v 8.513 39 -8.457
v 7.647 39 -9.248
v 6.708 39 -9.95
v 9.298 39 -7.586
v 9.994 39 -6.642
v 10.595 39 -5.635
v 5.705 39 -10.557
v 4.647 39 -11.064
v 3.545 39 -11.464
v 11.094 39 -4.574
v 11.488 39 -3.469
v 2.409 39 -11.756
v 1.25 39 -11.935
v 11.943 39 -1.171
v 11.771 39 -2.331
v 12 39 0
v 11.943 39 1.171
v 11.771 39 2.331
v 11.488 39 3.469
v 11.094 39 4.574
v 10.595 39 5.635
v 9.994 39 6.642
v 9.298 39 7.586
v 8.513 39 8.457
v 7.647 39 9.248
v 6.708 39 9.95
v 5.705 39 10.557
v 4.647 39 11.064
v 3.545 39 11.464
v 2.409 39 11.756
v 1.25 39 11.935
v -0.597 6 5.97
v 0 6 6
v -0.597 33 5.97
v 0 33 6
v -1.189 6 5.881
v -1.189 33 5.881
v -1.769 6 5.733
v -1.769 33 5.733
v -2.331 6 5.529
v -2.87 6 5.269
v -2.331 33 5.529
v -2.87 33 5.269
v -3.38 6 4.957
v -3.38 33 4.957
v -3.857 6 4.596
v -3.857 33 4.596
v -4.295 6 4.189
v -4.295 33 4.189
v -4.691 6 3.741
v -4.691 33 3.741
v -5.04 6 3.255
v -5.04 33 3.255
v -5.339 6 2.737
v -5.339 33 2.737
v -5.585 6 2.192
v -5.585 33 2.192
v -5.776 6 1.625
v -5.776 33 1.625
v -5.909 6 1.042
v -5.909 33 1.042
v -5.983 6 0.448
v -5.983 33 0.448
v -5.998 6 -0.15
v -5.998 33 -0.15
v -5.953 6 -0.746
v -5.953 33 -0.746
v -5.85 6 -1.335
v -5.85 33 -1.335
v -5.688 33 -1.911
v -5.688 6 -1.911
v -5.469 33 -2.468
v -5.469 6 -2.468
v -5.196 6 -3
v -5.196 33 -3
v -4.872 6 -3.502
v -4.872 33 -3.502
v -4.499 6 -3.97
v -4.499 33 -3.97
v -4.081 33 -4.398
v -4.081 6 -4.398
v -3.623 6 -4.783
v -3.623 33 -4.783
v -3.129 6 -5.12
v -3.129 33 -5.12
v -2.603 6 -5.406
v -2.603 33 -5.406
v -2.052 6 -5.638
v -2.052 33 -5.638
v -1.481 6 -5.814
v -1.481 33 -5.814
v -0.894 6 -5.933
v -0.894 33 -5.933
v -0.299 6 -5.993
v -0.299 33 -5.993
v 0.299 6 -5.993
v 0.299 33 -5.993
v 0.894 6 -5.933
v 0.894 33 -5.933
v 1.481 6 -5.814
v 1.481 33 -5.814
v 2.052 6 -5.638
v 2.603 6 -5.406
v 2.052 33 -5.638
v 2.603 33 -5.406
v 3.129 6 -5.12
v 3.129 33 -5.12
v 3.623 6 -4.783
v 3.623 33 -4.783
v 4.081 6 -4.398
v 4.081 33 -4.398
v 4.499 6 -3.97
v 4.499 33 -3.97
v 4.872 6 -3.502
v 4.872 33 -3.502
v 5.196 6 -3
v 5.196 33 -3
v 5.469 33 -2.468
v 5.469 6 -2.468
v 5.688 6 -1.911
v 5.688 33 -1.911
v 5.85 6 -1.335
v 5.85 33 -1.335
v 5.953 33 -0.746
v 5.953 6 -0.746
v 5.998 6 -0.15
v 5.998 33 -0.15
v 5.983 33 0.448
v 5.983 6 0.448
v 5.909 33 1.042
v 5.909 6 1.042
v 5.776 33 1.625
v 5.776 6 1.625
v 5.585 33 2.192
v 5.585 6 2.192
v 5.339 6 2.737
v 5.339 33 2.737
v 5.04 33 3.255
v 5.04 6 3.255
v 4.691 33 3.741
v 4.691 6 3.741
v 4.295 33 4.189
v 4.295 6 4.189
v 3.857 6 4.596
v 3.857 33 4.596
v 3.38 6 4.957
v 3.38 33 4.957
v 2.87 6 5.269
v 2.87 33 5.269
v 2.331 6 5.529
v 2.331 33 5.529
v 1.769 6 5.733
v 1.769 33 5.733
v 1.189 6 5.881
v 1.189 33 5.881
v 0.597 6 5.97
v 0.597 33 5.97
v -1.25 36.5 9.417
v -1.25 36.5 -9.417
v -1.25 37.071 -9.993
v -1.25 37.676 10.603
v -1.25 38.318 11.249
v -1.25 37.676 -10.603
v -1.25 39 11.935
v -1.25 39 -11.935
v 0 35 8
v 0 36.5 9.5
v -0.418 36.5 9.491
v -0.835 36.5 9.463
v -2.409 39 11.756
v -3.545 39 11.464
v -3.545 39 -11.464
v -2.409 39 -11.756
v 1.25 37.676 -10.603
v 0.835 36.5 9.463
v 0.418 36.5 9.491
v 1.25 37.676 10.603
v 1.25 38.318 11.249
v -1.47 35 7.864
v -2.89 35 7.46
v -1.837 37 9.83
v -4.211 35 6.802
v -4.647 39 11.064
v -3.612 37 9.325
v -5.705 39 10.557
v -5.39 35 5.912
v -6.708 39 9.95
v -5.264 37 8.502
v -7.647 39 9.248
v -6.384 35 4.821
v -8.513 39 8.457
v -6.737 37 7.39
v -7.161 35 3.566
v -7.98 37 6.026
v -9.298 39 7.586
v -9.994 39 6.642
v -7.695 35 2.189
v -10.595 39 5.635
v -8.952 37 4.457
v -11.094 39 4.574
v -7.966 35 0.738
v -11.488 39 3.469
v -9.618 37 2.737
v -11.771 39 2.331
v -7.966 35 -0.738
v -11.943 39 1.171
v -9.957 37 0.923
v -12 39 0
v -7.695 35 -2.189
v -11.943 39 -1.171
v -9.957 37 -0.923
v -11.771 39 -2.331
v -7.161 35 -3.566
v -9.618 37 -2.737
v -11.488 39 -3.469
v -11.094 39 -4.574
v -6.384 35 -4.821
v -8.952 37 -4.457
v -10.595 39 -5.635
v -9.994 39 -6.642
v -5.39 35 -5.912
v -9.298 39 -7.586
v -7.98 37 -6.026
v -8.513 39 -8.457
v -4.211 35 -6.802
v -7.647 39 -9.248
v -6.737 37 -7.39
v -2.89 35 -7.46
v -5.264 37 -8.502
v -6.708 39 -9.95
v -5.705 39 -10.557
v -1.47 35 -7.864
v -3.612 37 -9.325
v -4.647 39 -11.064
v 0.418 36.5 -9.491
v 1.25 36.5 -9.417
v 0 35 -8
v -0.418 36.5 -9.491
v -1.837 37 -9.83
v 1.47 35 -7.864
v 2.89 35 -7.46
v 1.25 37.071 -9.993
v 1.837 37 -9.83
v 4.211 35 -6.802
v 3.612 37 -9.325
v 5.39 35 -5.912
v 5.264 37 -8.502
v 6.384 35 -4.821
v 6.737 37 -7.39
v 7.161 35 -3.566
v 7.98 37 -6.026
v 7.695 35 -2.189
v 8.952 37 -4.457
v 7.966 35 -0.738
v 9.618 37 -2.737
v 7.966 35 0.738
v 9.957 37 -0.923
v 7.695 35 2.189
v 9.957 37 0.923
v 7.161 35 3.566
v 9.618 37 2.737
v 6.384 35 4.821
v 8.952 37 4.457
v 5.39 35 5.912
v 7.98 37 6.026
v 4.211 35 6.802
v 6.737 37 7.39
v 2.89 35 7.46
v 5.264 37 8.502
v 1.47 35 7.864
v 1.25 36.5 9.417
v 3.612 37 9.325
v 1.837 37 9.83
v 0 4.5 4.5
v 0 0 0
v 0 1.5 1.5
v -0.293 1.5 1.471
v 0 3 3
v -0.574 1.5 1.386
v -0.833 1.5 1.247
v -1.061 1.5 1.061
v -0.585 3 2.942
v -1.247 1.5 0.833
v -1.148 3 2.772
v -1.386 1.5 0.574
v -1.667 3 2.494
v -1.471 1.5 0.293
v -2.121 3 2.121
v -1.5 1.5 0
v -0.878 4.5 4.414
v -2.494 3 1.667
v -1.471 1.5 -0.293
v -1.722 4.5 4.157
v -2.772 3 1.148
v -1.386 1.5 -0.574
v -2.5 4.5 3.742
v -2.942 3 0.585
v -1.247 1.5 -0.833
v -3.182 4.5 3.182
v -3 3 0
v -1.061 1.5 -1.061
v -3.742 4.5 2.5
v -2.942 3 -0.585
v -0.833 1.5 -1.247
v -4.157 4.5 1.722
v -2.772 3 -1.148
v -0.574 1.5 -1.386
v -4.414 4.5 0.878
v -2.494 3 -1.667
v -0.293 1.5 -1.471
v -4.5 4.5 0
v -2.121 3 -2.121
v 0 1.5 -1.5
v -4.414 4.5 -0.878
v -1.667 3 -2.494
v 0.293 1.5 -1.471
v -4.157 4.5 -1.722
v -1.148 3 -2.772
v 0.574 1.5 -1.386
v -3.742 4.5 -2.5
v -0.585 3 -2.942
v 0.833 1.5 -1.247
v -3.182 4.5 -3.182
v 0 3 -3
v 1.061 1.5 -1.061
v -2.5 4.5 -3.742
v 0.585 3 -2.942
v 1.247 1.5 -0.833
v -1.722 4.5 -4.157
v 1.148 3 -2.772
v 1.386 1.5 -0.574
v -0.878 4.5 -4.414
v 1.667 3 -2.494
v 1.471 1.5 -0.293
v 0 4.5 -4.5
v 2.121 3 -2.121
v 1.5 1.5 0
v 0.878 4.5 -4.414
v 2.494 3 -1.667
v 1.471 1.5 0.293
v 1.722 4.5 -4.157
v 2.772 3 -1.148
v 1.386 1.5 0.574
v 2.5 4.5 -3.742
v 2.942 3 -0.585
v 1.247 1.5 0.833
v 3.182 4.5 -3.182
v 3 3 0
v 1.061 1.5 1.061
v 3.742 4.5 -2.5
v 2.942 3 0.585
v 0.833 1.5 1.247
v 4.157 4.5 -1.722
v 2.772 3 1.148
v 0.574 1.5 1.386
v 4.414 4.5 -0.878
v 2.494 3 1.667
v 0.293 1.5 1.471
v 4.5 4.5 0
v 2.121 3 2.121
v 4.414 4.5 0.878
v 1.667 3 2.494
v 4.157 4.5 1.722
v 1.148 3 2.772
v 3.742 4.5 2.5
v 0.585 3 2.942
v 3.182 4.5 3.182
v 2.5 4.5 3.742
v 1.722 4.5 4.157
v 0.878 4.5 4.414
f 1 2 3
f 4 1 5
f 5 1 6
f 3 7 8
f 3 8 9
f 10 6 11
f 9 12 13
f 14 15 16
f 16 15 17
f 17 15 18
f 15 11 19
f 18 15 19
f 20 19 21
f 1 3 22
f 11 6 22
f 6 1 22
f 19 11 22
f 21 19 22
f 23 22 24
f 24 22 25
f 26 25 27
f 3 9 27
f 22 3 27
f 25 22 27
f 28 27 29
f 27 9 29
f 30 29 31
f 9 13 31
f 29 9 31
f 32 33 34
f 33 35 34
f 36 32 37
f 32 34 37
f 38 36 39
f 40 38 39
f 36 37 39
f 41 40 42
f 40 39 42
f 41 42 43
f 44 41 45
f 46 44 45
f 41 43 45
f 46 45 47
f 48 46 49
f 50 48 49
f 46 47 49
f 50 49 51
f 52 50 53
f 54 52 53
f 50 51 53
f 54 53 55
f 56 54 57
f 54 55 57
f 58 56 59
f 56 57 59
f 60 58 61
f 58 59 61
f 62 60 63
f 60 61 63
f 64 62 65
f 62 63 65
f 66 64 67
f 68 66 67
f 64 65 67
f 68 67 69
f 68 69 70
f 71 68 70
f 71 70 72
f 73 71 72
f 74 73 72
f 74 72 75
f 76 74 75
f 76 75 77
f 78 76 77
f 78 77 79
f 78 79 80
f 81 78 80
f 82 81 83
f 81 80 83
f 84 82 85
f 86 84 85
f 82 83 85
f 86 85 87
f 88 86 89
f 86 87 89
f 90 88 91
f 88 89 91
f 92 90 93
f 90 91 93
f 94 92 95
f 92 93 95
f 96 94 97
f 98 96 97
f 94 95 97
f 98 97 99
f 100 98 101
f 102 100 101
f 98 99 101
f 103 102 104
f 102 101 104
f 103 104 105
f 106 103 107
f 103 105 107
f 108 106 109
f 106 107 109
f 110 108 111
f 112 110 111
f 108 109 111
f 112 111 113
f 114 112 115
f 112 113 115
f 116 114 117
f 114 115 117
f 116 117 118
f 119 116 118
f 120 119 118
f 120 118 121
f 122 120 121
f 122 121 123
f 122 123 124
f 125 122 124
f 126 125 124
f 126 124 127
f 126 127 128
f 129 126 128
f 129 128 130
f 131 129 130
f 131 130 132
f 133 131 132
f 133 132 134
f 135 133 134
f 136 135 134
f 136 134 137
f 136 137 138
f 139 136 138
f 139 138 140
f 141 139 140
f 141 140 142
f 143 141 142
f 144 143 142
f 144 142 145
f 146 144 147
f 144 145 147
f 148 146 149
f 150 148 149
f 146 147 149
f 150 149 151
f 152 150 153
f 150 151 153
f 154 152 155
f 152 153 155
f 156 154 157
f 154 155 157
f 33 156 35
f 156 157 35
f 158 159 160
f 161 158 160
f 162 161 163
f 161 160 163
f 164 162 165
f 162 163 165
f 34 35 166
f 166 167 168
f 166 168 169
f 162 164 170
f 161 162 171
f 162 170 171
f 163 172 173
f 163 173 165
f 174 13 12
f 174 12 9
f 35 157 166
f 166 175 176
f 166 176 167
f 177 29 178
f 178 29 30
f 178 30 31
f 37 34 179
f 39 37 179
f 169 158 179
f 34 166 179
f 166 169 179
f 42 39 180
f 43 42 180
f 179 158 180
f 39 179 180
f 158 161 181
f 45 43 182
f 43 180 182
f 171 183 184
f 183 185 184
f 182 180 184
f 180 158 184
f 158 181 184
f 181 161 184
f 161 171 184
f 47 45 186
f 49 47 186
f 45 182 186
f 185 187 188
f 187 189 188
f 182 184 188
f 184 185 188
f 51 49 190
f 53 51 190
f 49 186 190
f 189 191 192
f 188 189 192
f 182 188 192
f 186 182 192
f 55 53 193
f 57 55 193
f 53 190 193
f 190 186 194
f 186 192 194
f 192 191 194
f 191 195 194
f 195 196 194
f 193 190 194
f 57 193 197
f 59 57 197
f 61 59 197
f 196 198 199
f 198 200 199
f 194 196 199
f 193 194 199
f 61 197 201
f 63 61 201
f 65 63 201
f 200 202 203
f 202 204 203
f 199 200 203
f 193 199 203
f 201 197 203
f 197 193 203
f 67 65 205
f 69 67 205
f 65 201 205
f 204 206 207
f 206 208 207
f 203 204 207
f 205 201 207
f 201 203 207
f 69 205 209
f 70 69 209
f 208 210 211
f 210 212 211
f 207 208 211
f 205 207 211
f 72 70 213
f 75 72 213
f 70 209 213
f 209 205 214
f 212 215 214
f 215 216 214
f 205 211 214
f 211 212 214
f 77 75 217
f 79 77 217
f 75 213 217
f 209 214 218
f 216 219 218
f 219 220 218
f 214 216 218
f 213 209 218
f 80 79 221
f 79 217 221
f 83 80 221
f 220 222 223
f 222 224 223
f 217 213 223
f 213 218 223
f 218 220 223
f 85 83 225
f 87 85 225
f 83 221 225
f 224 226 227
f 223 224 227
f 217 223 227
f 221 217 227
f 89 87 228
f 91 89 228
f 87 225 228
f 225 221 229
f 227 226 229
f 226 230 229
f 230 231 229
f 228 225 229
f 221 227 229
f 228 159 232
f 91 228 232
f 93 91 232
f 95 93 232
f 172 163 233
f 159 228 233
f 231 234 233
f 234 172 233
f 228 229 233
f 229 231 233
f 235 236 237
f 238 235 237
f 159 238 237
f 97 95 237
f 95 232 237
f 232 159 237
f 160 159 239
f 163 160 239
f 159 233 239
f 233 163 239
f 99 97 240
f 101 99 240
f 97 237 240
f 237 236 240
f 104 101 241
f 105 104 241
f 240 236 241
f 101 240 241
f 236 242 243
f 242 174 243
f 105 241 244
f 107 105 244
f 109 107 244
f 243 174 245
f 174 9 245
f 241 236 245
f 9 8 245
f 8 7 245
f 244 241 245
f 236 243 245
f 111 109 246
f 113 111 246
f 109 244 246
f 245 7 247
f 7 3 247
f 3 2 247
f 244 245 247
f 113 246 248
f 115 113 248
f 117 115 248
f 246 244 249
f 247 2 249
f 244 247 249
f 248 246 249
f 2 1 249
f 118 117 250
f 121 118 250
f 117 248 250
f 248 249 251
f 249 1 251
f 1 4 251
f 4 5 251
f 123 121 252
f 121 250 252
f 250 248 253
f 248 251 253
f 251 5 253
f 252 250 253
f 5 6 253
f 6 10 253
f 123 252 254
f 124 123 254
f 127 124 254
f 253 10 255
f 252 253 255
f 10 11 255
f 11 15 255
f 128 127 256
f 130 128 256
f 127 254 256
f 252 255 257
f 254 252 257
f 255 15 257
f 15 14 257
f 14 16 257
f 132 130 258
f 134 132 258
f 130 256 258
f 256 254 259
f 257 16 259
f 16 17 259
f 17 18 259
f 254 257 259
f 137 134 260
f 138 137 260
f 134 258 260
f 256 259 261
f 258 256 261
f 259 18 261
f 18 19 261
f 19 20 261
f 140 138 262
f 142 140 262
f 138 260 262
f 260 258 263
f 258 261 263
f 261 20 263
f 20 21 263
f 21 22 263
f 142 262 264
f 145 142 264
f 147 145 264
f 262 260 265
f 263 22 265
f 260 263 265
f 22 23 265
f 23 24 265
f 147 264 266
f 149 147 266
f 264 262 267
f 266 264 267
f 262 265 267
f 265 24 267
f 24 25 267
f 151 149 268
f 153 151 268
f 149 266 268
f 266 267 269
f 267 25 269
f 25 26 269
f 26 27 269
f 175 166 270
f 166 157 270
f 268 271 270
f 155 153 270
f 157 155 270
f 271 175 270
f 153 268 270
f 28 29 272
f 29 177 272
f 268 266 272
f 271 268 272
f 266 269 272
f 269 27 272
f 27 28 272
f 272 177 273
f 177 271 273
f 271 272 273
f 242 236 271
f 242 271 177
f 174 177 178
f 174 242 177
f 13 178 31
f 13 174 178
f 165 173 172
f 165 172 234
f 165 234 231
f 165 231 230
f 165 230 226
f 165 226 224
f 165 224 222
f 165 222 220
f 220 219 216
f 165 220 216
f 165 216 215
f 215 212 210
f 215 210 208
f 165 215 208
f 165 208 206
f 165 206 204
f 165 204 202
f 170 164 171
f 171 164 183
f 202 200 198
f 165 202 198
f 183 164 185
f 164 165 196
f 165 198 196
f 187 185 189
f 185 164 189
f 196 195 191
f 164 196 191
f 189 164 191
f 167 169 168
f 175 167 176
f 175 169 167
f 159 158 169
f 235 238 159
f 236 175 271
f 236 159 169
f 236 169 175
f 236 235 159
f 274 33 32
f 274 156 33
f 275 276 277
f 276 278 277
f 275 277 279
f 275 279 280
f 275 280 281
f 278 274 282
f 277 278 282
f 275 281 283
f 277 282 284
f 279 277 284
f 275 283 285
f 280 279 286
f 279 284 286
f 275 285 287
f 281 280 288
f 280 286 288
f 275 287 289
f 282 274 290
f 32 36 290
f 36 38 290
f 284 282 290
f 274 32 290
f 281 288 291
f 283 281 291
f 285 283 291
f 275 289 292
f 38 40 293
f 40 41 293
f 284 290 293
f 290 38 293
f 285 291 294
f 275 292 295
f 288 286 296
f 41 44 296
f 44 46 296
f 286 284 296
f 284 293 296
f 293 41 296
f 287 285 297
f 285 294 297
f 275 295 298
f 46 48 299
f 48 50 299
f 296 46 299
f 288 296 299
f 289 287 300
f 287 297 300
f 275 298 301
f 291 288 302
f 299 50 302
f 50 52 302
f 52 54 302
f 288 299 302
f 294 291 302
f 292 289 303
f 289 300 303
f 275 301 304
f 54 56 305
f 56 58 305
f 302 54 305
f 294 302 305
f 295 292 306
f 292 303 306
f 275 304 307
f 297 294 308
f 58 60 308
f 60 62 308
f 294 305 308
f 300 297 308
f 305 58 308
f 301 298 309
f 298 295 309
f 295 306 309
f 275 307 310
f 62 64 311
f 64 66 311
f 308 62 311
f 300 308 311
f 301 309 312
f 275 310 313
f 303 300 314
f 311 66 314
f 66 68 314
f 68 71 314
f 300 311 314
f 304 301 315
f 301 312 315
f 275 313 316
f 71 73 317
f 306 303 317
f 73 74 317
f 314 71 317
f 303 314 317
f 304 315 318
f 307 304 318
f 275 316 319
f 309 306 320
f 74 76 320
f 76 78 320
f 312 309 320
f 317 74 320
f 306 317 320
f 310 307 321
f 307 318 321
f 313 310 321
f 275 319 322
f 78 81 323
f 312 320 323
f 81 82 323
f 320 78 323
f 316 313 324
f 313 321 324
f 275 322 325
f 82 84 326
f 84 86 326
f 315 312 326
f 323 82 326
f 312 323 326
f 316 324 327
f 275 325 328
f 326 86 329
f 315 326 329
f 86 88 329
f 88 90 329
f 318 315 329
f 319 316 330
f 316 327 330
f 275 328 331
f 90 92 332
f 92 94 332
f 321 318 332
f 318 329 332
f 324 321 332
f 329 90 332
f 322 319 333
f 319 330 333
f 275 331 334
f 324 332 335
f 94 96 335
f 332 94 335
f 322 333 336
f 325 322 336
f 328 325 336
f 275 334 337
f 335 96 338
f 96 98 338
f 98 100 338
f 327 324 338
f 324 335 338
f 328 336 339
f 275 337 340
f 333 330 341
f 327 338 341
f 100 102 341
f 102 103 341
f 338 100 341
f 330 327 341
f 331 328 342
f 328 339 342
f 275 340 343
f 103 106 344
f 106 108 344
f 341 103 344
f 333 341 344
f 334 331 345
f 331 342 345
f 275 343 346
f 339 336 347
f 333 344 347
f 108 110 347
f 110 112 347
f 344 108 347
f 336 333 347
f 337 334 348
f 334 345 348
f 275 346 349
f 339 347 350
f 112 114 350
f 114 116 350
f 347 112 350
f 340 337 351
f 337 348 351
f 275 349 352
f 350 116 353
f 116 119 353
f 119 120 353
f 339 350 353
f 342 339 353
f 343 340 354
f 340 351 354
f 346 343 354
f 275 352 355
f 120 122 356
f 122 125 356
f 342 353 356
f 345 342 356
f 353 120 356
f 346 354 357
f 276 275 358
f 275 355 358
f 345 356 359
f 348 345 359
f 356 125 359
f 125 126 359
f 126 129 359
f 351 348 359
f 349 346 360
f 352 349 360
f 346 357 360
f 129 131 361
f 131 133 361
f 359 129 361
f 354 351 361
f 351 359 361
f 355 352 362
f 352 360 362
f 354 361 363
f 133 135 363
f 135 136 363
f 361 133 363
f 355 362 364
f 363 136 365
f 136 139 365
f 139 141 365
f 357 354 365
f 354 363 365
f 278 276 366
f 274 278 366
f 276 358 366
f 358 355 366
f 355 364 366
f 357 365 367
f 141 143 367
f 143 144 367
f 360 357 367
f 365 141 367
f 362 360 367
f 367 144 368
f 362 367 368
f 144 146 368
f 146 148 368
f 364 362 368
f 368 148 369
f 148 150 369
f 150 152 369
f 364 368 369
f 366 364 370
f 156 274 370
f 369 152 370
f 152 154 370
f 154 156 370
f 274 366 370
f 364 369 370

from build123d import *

# Parameters (mm, degrees)
CUT_EXTRUDE1_DEPTH      = 43.532340636
CUT_EXTRUDE1_DEPTH_BACK = 43.532340636
SKETCH2_W               = 2.5
SKETCH2_H               = 2.5


with BuildPart() as part:
    # Sketch1 → Revolve1 (revolve)
    with BuildSketch(Plane(origin=(0, 0, 0), x_dir=(0, 0, -1), z_dir=(1, 0, 0)), mode=Mode.PRIVATE) as revolve1_sk:
        Polygon((0, 0), (6, 6), (6, 33), (12, 39), (0, 39), align=None)
    revolve(revolve1_sk.sketch.rotate(Axis((0, 39, 0), (0, -1, 0)), 180), axis=Axis((0, 39, 0), (0, -1, 0)))

    # Sketch2 → Cut-Extrude1 (cut, two sides: drawn at the far end of the back side and taken through both)
    with BuildSketch(Plane.XY.offset(-CUT_EXTRUDE1_DEPTH_BACK)):
        with Locations((0, 37.75)):
            Rectangle(SKETCH2_W, SKETCH2_H)
    extrude(amount=CUT_EXTRUDE1_DEPTH + CUT_EXTRUDE1_DEPTH_BACK, mode=Mode.SUBTRACT)


solid = part.part
